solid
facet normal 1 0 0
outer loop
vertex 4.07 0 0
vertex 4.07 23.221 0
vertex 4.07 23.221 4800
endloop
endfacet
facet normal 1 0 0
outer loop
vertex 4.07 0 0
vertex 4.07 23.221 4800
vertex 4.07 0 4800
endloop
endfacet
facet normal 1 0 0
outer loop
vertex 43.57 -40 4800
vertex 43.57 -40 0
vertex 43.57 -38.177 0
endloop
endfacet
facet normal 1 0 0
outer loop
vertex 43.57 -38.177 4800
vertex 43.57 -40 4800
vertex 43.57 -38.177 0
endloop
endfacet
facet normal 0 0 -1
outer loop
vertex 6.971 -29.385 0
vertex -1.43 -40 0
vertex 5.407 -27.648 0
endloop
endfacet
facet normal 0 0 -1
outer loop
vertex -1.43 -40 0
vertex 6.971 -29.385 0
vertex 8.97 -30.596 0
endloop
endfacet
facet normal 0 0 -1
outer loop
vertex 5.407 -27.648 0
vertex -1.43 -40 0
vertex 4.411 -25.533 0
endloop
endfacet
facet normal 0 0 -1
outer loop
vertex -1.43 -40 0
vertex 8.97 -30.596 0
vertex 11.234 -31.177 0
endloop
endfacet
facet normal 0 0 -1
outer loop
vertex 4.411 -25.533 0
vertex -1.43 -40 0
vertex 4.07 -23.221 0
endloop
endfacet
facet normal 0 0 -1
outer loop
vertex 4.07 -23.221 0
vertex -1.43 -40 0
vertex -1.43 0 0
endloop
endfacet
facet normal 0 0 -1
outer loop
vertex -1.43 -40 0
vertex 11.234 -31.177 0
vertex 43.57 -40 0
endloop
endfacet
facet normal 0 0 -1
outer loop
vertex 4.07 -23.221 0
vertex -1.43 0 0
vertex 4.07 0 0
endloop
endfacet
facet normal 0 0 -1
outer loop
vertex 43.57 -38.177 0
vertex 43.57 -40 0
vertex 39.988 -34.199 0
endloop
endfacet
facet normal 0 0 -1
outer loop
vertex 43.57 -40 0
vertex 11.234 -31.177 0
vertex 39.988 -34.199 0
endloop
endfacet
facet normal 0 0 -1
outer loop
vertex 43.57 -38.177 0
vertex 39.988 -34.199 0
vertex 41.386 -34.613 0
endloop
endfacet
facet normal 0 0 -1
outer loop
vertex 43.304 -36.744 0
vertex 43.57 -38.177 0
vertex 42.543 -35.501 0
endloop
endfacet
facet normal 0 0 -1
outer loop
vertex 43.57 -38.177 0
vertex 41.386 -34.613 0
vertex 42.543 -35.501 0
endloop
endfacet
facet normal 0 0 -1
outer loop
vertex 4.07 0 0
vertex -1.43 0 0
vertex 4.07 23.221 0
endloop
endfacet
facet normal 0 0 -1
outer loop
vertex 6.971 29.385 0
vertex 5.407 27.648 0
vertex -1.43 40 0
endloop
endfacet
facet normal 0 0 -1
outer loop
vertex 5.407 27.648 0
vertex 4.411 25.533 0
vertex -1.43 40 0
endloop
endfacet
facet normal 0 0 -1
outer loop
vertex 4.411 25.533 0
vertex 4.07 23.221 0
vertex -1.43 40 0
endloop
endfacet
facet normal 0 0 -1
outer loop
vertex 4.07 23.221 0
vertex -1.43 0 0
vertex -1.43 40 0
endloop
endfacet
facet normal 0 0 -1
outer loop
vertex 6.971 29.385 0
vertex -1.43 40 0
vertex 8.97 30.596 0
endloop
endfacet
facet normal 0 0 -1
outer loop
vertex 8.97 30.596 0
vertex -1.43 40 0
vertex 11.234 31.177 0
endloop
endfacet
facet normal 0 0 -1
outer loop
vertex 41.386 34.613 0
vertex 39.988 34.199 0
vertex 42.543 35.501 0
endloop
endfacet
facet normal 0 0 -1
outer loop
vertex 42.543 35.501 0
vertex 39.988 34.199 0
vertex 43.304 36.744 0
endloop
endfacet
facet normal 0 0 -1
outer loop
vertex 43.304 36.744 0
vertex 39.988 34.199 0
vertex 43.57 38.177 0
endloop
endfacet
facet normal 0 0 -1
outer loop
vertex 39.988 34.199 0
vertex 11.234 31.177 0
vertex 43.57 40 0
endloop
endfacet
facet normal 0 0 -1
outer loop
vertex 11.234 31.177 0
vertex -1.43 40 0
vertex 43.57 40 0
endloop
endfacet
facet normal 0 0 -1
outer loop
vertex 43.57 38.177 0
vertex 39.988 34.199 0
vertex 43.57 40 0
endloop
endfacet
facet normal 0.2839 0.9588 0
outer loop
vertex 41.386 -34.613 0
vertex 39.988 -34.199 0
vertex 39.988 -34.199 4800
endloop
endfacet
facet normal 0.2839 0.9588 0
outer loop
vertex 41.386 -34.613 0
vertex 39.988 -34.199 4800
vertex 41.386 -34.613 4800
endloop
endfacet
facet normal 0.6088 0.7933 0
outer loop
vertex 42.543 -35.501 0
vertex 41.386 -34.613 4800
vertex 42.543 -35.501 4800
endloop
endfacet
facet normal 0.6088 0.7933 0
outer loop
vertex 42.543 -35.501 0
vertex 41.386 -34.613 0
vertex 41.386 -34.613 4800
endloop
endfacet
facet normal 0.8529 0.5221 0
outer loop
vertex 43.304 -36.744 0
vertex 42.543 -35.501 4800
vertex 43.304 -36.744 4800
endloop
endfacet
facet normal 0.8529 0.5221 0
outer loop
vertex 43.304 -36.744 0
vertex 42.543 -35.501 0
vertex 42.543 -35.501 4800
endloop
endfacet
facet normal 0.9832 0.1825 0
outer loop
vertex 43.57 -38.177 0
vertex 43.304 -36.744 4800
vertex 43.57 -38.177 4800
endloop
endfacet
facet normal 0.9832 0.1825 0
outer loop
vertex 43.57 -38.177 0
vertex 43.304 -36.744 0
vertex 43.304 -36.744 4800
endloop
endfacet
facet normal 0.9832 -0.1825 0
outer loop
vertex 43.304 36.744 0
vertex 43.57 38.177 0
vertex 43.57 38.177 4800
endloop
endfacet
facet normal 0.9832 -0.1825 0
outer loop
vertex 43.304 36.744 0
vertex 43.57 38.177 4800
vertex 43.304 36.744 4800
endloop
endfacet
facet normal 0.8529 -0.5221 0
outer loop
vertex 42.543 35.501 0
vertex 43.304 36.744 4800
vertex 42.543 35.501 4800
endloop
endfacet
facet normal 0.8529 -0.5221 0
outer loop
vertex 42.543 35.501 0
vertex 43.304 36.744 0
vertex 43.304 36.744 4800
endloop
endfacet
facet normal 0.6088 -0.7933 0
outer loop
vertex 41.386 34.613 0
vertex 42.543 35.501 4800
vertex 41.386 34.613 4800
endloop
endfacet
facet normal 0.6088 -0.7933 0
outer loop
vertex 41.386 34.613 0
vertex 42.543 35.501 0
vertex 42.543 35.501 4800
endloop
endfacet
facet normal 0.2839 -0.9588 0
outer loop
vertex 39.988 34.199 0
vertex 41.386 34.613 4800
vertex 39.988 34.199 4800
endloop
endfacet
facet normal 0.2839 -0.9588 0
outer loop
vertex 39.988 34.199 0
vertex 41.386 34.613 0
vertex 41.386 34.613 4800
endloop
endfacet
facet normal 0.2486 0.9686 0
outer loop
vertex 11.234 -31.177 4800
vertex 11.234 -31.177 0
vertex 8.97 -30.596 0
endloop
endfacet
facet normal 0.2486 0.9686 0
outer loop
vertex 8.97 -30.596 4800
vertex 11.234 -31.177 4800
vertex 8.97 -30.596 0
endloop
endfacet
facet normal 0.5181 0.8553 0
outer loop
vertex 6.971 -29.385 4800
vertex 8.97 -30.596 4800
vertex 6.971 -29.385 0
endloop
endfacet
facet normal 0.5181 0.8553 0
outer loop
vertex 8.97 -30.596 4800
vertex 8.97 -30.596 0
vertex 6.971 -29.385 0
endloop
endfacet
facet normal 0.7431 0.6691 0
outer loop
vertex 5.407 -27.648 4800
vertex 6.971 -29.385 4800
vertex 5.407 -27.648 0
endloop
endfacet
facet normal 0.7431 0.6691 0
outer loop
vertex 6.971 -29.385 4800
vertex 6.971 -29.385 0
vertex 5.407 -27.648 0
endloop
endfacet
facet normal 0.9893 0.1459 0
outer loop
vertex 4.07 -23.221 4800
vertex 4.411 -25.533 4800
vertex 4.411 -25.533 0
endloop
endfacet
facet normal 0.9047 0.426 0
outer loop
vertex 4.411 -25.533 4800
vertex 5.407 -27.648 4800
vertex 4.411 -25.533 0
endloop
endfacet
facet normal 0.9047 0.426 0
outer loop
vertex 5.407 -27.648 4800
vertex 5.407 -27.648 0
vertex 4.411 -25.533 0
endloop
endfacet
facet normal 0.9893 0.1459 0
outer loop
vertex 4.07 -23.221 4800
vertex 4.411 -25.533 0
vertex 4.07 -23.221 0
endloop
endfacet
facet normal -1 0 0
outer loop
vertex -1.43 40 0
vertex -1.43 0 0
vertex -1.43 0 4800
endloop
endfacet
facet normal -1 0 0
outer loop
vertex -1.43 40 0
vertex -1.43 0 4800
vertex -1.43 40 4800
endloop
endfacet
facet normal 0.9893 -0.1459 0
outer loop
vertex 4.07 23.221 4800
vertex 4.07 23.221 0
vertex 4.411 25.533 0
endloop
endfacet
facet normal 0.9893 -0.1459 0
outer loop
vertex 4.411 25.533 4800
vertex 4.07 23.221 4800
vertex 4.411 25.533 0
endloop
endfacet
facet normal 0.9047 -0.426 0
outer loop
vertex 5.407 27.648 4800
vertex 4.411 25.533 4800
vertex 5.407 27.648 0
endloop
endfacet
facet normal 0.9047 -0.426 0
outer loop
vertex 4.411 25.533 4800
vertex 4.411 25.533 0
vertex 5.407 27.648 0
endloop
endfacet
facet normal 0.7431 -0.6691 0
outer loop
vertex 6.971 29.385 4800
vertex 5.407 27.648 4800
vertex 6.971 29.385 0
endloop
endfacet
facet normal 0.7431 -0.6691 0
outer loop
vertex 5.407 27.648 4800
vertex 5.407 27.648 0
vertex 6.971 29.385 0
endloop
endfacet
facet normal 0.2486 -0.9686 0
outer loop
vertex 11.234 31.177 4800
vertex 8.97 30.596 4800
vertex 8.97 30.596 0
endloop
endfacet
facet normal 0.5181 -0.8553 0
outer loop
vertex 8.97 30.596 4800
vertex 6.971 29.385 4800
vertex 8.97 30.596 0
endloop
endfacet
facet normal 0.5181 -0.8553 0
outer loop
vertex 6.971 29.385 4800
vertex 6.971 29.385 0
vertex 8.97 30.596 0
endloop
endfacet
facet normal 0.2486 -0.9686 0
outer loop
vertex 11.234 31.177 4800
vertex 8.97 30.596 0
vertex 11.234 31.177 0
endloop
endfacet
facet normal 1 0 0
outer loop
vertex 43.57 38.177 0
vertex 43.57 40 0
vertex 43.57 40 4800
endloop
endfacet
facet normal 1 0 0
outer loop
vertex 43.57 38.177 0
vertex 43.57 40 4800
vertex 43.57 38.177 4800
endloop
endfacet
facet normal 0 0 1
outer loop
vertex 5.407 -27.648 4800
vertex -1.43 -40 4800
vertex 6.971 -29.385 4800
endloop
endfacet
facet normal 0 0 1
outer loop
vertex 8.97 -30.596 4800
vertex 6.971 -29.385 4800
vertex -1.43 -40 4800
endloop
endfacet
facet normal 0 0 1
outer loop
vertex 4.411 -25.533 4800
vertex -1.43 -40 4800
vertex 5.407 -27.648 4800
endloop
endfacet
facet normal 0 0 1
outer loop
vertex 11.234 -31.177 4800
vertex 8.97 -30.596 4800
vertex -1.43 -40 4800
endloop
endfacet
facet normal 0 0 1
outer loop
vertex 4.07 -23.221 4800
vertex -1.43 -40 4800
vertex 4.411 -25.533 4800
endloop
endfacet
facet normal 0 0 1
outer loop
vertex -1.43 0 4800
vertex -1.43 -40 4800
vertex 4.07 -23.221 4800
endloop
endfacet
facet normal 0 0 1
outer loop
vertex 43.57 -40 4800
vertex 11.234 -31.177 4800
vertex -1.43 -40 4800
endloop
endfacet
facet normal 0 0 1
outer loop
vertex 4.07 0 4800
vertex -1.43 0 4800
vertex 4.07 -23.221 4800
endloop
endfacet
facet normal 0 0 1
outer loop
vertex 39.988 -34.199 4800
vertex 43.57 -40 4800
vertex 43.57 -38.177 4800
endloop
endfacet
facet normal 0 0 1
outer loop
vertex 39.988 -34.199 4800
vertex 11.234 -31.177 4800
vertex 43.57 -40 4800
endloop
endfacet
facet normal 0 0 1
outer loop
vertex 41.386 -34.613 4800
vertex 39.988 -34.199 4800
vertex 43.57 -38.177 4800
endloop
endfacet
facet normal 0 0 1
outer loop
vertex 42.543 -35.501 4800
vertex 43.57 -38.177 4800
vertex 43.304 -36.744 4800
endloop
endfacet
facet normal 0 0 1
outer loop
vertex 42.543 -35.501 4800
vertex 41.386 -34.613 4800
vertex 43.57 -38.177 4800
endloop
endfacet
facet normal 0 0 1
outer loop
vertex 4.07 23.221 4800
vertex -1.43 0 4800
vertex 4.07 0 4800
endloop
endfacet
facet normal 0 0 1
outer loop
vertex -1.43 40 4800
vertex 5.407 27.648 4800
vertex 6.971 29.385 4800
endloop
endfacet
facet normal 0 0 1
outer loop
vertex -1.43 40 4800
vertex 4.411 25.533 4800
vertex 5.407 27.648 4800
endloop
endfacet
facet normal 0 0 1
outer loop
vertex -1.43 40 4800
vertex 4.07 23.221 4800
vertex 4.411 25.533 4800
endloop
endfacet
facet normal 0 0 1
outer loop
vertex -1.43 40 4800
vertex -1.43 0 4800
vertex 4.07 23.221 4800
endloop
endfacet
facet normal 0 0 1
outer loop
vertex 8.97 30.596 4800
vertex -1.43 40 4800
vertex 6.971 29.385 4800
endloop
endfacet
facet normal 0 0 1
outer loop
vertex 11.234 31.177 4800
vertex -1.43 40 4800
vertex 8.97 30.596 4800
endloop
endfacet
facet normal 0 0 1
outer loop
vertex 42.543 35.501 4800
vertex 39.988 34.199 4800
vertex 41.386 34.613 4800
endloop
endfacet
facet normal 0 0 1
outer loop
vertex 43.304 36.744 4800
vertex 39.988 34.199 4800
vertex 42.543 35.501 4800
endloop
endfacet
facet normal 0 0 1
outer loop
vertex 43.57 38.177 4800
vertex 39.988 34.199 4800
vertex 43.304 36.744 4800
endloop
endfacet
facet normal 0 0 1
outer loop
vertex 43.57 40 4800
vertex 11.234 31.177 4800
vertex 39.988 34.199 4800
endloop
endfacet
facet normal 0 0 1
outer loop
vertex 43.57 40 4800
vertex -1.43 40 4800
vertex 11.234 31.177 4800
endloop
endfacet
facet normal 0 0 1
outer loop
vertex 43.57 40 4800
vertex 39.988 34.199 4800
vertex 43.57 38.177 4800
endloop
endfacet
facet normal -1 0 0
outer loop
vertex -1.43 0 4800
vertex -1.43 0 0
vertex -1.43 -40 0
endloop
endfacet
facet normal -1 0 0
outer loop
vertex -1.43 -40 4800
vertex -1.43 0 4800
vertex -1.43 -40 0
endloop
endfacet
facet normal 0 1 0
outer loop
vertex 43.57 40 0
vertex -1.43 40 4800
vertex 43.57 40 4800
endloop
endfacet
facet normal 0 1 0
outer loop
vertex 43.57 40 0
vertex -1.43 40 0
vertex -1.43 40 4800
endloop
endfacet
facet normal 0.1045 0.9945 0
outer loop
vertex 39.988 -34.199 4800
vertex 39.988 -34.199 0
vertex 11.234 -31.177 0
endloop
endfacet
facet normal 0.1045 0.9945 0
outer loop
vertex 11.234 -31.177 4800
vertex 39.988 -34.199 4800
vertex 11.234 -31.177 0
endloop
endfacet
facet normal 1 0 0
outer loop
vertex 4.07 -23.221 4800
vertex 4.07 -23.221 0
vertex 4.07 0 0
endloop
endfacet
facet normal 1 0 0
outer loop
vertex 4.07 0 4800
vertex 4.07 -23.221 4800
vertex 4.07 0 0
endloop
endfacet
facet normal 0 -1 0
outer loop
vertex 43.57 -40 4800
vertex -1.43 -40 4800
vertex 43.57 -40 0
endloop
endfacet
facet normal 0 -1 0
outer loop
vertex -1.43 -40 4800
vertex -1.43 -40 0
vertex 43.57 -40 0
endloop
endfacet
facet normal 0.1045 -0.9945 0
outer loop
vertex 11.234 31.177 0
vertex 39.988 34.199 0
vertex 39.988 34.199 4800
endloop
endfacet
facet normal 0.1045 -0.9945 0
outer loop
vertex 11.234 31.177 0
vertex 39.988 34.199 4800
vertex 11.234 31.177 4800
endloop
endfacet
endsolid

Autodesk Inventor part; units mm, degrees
ref_plane "YZ Plane" through (0, 0, 0) normal (1, 0, 0) x (0, 1, 0)
ref_plane "Start plane" through (0, 0, 0) normal (0, 0, 1) x (1, 0, 0)
ref_plane "End plane" through (0, 0, 4800) normal (0, 0, 1) x (1, 0, 0)
sketch "Sketch" plane through (0, 0, 0) normal (0, 0, 1) x (1, 0, 0)
  line L0 (-1.43, 0) -> (-1.43, 40)
  line L1 (-1.43, 40) -> (43.57, 40)
  line L2 (43.57, 40) -> (43.57, 38.1774)
  line L3 (39.9881, 34.1993) -> (11.2338, 31.1771)
  line L4 (4.07, 23.221) -> (4.07, 0)
  line L5 (4.07, 0) -> (-1.43, 0) construction
  line L6 (23.82, 40) -> (23.82, 32.5) construction
  line L7 (43.57, 34.5758) -> (43.57, 32.5) construction
  line L8 (43.57, 32.5) -> (23.82, 32.5) construction
  line L9 (0, 15) -> (0, -27) construction
  line L10 (-5.539, 0) -> (16.0067, 0) construction
  line L11 (-1.43, 0) -> (-1.43, -40)
  line L12 (-1.43, -40) -> (43.57, -40)
  line L13 (43.57, -40) -> (43.57, -38.1774)
  line L14 (39.9881, -34.1993) -> (11.2338, -31.1771)
  line L15 (4.07, -23.221) -> (4.07, 0)
  arc A0 (11.2338, 31.1771) -> (4.07, 23.221) centre (12.07, 23.221) ccw
  arc A1 (4.07, -23.221) -> (11.2338, -31.1771) centre (12.07, -23.221) ccw
  arc A2 (39.9881, 34.1993) -> (43.57, 38.1774) centre (39.57, 38.1774) ccw
  arc A3 (43.57, -38.1774) -> (39.9881, -34.1993) centre (39.57, -38.1774) ccw
  line L16 (0, 23.4) -> (0, -35.4) construction
  line L17 (-9.8481, 0) -> (20.3158, 0) construction
  point P0 (4.07, 30.4242)
  point P1 (43.57, -34.5758)
  point P2 (4.07, -30.4242)
  point P3 (23.82, -40)
  point P4 (23.82, -32.5)
  dimension "d0" = 5.5
  dimension "d1" = 40
  dimension "d2" = 45
  dimension "d3" = 7.5
  dimension "d4" = 19.75
  dimension "d5" = 2.0758
  dimension "d23" = 8
  dimension "d24" = 4
  dimension "d25" = 1.43
extrude "Body" add sketch "Sketch" along normal up to surface (4800 mm away) from surface at 0
sketch "Sketch3" plane through (0, 0, 0) normal (0, 0, 1) x (1, 0, 0)
  line L0 (0, 0) -> (10, 0)
ref_plane "Work Plane3" through (0, 0, 0) normal (0, -1, 0) x (1, 0, 0)
sketch "Sketch4" plane through (0, 0, 0) normal (0, -1, 0) x (1, 0, 0)
  line L0 (-2, 0) -> (12, 0) projected
  line L1 (-2, 4800) -> (12, 4800) projected
  dimension "d29" = 4800
equation "\"d0\" = G_T"
equation "\"d1\" = 0.5 * G_H"
equation "\"d2\" = G_W"
equation "\"d3\" = G_T1"
equation "\"d4\" = G_C"
equation "\"d23\" = G_IR"
equation "\"d24\" = G_ER"
equation "\"d25\" = ex"
equation "\"d6\" = G_L"
equation "\"G_W\" = 45"
equation "\"G_T\" = 5.5"
equation "\"G_T1\" = 7.5"
equation "\"G_NG\" = 0.105104"
equation "\"G_ER\" = 4"
equation "\"G_IR\" = 8"
equation "\"G_C\" = 19.75"
equation "\"G_L\" = d29"
equation "\"ex\" = 1.43"
equation "\"G_OFFSET_START\" = 0"
equation "\"G_OFFSET_END\" = 0"
equation "\"G_H\" = 80"
properties part number "ISO 657/11 - CH 80 x 8 - 4800" material "Steel, Mild"
